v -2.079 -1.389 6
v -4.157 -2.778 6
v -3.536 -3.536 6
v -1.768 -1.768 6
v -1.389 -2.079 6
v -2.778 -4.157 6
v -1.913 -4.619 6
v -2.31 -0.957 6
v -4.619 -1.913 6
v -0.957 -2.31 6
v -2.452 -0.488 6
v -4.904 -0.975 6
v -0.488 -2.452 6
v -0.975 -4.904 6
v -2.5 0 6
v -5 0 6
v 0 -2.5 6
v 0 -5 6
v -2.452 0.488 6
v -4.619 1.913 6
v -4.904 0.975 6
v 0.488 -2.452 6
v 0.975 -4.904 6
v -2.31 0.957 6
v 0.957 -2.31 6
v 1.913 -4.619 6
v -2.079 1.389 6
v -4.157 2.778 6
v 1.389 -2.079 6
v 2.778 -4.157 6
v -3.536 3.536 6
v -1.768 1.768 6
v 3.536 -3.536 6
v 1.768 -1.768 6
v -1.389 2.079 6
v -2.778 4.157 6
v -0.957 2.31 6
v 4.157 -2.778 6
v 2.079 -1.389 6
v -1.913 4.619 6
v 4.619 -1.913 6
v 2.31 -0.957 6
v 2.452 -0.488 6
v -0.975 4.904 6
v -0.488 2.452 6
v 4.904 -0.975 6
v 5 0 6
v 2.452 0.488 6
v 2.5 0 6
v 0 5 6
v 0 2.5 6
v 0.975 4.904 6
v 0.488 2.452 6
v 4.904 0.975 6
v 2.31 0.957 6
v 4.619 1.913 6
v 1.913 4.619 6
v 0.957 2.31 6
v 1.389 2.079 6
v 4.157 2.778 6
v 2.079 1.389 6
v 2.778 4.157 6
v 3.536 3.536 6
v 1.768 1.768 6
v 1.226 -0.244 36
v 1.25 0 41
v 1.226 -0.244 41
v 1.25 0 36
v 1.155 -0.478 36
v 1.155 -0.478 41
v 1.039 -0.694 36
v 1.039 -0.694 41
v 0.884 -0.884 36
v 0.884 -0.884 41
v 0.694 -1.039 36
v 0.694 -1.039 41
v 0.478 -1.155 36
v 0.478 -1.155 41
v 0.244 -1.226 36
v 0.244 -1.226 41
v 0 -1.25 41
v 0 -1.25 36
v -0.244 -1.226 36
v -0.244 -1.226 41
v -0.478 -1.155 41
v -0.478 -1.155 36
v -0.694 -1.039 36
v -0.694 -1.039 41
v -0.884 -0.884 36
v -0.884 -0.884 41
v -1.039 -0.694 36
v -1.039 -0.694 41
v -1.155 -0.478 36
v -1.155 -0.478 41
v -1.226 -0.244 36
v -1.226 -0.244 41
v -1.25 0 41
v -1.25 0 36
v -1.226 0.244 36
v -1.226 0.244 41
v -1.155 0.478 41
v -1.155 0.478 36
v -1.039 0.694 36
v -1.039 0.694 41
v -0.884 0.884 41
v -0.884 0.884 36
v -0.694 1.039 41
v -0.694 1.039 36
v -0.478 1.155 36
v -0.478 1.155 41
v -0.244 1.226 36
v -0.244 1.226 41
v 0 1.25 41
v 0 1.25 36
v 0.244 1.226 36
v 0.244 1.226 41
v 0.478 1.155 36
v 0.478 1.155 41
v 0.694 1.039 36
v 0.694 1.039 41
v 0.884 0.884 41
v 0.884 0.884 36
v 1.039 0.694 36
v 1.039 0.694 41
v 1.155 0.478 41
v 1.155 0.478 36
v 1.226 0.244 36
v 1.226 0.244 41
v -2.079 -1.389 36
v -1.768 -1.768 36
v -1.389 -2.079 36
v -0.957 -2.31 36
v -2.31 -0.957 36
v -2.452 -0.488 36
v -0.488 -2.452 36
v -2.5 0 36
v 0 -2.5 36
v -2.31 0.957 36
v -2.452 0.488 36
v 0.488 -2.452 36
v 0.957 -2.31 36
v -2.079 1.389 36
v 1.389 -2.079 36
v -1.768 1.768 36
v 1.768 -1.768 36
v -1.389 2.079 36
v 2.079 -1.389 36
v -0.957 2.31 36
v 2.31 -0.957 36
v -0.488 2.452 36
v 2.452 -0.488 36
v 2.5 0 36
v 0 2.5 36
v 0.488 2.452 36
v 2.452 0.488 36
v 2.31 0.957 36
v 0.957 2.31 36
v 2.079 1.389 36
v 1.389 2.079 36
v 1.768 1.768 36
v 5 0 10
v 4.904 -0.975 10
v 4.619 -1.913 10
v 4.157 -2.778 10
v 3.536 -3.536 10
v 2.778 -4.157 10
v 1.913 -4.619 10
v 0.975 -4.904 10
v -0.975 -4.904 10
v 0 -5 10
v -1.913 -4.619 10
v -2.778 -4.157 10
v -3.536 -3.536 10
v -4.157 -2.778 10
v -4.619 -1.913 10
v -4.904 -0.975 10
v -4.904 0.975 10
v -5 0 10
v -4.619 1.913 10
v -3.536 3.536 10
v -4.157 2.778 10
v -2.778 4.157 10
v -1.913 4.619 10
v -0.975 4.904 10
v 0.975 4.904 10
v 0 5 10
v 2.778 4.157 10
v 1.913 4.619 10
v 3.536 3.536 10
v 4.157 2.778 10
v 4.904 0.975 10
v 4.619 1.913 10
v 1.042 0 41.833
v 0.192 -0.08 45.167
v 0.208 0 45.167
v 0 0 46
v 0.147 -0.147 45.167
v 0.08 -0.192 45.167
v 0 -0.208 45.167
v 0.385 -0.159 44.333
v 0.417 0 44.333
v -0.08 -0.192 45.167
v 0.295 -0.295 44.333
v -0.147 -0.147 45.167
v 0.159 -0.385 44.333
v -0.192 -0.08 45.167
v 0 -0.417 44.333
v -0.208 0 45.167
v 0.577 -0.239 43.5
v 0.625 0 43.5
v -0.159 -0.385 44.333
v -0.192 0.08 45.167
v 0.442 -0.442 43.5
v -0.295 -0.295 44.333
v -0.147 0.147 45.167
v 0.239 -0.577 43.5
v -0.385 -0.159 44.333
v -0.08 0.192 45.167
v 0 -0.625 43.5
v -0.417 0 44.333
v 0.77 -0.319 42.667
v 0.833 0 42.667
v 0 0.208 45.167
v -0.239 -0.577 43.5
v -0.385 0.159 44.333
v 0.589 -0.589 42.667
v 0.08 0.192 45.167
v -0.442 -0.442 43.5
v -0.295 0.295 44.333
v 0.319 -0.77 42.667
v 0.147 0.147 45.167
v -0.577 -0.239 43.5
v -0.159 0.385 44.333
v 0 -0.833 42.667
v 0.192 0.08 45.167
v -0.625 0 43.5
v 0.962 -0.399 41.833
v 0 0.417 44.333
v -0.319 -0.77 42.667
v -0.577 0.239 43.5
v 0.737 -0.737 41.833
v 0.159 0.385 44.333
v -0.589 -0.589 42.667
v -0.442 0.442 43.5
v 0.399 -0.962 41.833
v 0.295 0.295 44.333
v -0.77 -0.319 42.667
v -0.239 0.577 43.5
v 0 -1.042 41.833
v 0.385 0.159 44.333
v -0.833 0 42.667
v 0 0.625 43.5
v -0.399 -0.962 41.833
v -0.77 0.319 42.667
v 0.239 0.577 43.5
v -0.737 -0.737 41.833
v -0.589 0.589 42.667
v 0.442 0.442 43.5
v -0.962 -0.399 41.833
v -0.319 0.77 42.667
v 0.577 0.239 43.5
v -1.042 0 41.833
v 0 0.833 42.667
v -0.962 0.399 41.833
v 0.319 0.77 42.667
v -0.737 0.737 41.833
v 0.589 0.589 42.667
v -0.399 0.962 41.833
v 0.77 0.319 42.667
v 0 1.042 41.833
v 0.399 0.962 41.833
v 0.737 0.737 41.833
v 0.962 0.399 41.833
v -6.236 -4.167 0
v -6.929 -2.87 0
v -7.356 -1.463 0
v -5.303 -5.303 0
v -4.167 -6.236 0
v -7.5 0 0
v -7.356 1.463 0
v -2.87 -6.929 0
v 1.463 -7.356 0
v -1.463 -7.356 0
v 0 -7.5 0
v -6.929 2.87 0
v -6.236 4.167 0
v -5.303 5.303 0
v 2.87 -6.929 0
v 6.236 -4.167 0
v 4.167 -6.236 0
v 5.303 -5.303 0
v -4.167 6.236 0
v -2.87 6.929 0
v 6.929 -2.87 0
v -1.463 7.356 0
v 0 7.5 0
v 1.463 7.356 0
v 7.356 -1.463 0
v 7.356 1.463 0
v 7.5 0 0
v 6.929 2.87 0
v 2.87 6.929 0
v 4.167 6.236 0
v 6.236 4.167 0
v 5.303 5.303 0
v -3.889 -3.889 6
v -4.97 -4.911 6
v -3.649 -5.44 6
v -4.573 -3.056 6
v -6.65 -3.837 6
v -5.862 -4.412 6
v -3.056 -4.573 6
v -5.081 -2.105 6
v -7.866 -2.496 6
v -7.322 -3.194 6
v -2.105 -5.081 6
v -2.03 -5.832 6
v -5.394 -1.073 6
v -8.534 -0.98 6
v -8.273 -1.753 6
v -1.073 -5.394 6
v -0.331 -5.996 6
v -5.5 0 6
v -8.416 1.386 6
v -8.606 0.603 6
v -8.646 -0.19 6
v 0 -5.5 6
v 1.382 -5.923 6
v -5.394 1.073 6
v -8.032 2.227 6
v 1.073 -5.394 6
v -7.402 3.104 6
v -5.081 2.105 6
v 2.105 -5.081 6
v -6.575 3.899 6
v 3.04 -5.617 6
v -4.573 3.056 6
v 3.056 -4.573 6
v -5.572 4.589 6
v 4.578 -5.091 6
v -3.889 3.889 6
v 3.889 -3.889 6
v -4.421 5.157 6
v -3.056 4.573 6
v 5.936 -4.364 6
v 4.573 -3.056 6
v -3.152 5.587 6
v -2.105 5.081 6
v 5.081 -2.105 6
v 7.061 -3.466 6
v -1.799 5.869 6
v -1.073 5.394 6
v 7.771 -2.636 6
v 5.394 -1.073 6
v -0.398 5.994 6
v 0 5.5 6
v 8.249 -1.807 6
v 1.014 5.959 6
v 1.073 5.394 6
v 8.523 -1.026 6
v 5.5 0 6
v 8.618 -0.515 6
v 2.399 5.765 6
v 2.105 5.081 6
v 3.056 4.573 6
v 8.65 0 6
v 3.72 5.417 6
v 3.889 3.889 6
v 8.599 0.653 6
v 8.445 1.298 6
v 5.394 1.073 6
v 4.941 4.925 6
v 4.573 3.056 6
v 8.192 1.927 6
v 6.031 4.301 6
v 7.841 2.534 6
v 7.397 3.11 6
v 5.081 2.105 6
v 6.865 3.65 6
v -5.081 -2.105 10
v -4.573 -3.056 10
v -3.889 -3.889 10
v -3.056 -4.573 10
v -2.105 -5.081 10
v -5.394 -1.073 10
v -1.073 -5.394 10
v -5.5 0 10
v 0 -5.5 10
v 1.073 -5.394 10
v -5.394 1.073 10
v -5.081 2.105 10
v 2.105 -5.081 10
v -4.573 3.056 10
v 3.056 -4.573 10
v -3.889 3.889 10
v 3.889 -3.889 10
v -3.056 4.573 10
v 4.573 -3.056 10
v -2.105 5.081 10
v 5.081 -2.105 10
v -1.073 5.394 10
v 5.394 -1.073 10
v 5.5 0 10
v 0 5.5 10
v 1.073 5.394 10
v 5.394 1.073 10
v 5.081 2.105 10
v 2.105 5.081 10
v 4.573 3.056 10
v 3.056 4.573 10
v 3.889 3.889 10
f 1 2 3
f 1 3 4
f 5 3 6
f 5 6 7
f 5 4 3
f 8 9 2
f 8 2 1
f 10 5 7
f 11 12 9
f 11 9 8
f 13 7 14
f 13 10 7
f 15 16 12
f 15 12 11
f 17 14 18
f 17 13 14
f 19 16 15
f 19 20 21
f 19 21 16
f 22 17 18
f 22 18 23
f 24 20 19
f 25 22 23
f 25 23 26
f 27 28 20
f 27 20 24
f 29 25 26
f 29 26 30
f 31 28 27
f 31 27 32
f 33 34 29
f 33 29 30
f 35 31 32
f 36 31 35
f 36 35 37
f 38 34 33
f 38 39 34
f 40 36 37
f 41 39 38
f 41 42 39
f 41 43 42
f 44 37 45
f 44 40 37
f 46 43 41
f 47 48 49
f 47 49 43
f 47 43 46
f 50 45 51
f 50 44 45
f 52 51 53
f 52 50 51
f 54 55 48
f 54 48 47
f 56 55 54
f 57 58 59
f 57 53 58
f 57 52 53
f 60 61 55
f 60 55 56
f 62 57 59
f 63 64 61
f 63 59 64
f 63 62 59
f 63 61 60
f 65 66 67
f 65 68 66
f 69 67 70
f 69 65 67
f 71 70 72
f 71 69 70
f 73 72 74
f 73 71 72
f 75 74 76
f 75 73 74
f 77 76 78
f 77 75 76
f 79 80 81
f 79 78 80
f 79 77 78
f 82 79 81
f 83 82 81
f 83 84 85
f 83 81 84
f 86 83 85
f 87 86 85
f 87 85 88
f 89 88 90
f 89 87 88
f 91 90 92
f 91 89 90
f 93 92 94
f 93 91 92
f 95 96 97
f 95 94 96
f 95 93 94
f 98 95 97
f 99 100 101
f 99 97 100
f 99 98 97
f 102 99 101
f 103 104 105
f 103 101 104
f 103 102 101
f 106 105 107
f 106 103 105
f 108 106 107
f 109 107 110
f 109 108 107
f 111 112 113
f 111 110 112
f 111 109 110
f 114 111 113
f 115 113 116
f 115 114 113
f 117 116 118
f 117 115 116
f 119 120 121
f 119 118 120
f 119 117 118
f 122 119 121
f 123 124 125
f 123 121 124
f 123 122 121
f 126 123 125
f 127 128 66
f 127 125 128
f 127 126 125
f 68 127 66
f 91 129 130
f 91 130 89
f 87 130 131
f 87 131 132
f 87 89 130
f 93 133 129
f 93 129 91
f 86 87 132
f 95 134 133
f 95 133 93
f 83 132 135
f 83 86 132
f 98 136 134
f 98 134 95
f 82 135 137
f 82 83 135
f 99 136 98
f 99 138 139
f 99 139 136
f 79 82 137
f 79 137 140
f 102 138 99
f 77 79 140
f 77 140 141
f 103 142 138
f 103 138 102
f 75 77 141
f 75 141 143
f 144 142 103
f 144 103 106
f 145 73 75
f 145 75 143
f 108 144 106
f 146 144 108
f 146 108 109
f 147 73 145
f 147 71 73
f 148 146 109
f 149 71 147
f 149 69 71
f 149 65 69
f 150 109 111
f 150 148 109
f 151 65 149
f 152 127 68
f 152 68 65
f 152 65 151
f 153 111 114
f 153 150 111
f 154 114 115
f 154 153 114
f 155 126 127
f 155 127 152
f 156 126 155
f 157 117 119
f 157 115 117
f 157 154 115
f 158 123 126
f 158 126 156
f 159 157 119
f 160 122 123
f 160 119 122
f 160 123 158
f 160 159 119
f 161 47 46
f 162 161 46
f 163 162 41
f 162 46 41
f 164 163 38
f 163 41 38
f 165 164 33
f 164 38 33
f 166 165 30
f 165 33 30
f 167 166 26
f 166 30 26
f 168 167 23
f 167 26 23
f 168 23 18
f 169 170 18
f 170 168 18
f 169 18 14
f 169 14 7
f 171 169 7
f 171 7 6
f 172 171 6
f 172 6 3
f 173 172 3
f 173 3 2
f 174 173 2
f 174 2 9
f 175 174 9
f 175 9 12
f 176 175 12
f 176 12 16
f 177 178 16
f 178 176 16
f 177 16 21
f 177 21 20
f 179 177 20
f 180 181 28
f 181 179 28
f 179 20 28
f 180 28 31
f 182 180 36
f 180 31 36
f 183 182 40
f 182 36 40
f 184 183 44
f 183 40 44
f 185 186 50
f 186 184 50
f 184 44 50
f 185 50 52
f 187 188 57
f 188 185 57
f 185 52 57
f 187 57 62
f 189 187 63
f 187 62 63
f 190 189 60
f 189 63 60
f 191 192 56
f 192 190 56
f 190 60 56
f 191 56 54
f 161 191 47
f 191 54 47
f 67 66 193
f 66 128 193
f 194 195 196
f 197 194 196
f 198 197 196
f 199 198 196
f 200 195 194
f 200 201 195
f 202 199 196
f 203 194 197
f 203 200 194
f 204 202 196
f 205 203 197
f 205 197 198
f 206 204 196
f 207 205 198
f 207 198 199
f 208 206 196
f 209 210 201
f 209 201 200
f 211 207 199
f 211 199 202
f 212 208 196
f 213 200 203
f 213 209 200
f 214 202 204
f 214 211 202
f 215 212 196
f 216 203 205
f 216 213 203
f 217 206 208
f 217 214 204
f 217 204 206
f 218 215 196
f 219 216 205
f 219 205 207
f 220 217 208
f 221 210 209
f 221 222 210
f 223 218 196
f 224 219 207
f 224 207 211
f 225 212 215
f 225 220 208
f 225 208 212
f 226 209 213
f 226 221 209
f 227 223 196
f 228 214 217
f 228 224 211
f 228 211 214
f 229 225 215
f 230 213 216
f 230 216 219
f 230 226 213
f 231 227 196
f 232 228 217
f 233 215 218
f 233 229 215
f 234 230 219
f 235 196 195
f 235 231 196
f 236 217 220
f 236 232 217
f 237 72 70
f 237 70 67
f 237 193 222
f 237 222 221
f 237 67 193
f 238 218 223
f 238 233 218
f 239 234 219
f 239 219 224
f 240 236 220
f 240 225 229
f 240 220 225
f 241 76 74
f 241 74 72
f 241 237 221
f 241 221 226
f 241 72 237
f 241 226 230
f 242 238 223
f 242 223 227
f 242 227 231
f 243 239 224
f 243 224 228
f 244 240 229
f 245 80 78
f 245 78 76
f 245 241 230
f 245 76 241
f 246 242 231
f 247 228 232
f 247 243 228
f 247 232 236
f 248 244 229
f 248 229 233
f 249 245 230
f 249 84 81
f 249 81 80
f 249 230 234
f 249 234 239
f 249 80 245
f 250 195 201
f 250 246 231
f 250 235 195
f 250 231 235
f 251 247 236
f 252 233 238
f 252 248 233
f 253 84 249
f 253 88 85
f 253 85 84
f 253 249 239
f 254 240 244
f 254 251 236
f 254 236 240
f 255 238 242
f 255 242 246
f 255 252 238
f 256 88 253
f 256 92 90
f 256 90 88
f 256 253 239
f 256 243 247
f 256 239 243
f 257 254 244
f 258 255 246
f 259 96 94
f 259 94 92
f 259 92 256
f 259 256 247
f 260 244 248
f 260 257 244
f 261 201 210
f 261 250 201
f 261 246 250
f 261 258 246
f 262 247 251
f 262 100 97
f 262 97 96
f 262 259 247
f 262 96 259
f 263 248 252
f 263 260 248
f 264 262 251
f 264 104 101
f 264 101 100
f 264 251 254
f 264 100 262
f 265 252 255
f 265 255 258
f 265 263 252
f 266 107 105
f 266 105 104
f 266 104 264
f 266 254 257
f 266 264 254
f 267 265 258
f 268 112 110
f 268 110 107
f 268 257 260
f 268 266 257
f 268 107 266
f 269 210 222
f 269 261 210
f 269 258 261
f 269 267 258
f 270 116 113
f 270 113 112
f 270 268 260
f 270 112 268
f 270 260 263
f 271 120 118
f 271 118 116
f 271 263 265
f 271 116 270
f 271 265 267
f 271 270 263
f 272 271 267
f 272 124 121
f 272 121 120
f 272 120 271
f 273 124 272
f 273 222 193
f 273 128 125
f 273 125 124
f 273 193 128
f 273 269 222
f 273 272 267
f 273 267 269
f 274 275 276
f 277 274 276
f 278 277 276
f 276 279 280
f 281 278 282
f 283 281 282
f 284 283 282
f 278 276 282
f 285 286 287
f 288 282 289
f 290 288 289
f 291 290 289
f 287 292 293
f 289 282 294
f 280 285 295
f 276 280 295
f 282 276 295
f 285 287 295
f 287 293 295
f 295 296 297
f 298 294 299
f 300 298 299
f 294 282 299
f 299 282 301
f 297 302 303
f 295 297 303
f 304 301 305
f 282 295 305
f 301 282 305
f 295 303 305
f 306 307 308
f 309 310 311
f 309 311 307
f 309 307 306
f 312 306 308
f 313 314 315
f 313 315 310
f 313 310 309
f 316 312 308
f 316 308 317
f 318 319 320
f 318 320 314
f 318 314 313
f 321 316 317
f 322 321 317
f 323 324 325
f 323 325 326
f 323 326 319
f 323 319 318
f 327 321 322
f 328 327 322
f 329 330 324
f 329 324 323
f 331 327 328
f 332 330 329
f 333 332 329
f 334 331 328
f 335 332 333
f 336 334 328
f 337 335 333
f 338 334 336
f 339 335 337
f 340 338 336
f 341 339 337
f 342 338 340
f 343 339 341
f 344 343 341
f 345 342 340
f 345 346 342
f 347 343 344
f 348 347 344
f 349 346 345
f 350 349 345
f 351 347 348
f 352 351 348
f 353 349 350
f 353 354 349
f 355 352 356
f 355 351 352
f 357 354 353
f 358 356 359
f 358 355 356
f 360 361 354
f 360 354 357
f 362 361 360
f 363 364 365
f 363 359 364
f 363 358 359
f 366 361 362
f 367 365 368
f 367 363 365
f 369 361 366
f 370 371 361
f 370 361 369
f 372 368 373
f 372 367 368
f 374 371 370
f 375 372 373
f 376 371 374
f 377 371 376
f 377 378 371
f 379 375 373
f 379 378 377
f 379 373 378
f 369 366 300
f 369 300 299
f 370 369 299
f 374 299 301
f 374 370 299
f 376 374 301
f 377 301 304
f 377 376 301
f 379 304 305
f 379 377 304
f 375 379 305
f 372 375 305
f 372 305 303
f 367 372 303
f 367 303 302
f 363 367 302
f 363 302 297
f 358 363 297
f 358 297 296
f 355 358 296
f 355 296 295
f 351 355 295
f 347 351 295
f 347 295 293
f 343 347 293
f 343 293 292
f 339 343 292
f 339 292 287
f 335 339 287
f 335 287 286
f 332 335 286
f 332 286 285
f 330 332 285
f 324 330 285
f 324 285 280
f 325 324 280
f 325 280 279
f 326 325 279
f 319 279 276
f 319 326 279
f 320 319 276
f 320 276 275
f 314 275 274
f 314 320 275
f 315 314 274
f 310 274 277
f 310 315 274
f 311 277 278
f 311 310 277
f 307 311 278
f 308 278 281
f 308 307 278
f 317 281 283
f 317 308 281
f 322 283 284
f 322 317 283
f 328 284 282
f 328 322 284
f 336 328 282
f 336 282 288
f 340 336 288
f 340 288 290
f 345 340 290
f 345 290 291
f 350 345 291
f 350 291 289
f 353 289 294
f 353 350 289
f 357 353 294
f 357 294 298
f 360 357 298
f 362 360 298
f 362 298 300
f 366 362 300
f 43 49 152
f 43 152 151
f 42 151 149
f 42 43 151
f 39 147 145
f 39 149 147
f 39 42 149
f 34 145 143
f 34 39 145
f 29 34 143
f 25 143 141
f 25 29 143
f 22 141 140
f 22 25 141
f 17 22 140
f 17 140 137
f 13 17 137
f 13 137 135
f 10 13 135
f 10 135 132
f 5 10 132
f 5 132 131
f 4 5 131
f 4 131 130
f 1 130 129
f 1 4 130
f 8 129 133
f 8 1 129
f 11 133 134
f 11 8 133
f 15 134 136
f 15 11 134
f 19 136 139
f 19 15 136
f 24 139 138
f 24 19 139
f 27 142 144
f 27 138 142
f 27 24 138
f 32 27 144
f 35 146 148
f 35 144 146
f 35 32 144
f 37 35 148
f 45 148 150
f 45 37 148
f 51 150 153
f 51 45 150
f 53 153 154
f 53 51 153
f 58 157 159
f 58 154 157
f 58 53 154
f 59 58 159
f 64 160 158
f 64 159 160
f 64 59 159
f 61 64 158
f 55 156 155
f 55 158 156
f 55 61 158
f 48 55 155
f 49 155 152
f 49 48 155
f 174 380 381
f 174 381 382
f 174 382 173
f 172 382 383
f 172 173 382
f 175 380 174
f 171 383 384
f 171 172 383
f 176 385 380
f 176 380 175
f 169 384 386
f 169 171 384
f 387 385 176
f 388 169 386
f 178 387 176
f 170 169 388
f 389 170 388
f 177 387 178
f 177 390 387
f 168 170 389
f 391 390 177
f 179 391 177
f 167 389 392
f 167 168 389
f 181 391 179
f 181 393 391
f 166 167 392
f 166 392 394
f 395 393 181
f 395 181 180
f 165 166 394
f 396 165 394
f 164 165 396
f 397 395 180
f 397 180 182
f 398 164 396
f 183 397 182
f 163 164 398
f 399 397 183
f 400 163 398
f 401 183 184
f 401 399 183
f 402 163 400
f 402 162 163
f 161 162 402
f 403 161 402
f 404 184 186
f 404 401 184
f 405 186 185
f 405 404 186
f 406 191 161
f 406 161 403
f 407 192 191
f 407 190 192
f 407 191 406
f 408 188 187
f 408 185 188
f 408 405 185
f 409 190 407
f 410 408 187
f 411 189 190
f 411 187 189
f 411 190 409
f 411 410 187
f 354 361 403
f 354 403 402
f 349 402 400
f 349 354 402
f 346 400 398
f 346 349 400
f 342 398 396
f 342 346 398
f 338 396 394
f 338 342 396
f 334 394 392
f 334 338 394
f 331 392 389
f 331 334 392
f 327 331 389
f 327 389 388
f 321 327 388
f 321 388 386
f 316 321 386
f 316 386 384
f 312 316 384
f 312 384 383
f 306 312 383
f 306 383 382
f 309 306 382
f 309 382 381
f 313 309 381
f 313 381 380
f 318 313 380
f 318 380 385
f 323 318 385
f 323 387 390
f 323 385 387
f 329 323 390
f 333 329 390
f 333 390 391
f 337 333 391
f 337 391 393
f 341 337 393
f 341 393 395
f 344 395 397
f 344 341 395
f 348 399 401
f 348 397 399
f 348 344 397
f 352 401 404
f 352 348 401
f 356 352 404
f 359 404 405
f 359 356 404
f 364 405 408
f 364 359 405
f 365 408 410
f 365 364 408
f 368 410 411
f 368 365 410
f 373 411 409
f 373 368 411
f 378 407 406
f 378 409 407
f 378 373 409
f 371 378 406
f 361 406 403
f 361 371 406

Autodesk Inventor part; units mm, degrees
ref_plane "YZ Plane" through (0, 0, 0) normal (1, 0, 0) x (0, 1, 0)
sketch "Sketch1" plane through (0, 0, 0) normal (0, 0, 1) x (1, 0, 0)
  circle A0 centre (0, 0) radius 7.5
  dimension "d0" = 15
ref_plane "Work Plane1" through (0, 0, 6) normal (0, 0, 1) x (1, 0, 0)
sketch "Sketch2" plane through (0, 0, 6) normal (0, 0, 1) x (1, 0, 0)
  ellipse E0 centre (0, 0) end of major axis (8.6502, 0) minor radius 6
  line L0 (0, 0) -> (-7.5, 0)
  dimension "d26" = 7.5
loft "Loft1" add profiles "Sketch1", "Sketch2"
sketch "Sketch3" plane through (0, 0, 6) normal (0, 0, 1) x (1, 0, 0)
  circle A0 centre (0, 0) radius 5
  circle A1 centre (0, 0) radius 5.5
  dimension "d11" = 10
  dimension "d12" = 11
extrude "Extrusion2" add sketch "Sketch3" along normal blind 4
sketch "Sketch4" plane through (0, 0, 6) normal (0, 0, 1) x (1, 0, 0)
  circle A0 centre (0, 0) radius 2.5
  dimension "d15" = 5
extrude "Extrusion3" add sketch "Sketch4" along normal blind 30
sketch "Sketch5" plane through (0, 0, 36) normal (0, 0, 1) x (1, 0, 0)
  circle A0 centre (0, 0) radius 1.25
  dimension "d18" = 2.5
extrude "Extrusion4" add sketch "Sketch5" along normal blind 5
sketch "Sketch6" plane through (0, 0, 41) normal (0, 0, 1) x (1, 0, 0)
  point P0 (0, 0)
ref_plane "Work Plane2" through (0, 0, 46) normal (0, 0, 1) x (1, 0, 0)
sketch "Sketch7" plane through (0, 0, 46) normal (0, 0, 1) x (1, 0, 0)
  point P0 (0, 0)
  point P1 (0, 0)
loft "Loft2" add section 1 edges at (-1.25, 0, 41) section 2 point at (0, 0, 46)
properties part number "Solder"
